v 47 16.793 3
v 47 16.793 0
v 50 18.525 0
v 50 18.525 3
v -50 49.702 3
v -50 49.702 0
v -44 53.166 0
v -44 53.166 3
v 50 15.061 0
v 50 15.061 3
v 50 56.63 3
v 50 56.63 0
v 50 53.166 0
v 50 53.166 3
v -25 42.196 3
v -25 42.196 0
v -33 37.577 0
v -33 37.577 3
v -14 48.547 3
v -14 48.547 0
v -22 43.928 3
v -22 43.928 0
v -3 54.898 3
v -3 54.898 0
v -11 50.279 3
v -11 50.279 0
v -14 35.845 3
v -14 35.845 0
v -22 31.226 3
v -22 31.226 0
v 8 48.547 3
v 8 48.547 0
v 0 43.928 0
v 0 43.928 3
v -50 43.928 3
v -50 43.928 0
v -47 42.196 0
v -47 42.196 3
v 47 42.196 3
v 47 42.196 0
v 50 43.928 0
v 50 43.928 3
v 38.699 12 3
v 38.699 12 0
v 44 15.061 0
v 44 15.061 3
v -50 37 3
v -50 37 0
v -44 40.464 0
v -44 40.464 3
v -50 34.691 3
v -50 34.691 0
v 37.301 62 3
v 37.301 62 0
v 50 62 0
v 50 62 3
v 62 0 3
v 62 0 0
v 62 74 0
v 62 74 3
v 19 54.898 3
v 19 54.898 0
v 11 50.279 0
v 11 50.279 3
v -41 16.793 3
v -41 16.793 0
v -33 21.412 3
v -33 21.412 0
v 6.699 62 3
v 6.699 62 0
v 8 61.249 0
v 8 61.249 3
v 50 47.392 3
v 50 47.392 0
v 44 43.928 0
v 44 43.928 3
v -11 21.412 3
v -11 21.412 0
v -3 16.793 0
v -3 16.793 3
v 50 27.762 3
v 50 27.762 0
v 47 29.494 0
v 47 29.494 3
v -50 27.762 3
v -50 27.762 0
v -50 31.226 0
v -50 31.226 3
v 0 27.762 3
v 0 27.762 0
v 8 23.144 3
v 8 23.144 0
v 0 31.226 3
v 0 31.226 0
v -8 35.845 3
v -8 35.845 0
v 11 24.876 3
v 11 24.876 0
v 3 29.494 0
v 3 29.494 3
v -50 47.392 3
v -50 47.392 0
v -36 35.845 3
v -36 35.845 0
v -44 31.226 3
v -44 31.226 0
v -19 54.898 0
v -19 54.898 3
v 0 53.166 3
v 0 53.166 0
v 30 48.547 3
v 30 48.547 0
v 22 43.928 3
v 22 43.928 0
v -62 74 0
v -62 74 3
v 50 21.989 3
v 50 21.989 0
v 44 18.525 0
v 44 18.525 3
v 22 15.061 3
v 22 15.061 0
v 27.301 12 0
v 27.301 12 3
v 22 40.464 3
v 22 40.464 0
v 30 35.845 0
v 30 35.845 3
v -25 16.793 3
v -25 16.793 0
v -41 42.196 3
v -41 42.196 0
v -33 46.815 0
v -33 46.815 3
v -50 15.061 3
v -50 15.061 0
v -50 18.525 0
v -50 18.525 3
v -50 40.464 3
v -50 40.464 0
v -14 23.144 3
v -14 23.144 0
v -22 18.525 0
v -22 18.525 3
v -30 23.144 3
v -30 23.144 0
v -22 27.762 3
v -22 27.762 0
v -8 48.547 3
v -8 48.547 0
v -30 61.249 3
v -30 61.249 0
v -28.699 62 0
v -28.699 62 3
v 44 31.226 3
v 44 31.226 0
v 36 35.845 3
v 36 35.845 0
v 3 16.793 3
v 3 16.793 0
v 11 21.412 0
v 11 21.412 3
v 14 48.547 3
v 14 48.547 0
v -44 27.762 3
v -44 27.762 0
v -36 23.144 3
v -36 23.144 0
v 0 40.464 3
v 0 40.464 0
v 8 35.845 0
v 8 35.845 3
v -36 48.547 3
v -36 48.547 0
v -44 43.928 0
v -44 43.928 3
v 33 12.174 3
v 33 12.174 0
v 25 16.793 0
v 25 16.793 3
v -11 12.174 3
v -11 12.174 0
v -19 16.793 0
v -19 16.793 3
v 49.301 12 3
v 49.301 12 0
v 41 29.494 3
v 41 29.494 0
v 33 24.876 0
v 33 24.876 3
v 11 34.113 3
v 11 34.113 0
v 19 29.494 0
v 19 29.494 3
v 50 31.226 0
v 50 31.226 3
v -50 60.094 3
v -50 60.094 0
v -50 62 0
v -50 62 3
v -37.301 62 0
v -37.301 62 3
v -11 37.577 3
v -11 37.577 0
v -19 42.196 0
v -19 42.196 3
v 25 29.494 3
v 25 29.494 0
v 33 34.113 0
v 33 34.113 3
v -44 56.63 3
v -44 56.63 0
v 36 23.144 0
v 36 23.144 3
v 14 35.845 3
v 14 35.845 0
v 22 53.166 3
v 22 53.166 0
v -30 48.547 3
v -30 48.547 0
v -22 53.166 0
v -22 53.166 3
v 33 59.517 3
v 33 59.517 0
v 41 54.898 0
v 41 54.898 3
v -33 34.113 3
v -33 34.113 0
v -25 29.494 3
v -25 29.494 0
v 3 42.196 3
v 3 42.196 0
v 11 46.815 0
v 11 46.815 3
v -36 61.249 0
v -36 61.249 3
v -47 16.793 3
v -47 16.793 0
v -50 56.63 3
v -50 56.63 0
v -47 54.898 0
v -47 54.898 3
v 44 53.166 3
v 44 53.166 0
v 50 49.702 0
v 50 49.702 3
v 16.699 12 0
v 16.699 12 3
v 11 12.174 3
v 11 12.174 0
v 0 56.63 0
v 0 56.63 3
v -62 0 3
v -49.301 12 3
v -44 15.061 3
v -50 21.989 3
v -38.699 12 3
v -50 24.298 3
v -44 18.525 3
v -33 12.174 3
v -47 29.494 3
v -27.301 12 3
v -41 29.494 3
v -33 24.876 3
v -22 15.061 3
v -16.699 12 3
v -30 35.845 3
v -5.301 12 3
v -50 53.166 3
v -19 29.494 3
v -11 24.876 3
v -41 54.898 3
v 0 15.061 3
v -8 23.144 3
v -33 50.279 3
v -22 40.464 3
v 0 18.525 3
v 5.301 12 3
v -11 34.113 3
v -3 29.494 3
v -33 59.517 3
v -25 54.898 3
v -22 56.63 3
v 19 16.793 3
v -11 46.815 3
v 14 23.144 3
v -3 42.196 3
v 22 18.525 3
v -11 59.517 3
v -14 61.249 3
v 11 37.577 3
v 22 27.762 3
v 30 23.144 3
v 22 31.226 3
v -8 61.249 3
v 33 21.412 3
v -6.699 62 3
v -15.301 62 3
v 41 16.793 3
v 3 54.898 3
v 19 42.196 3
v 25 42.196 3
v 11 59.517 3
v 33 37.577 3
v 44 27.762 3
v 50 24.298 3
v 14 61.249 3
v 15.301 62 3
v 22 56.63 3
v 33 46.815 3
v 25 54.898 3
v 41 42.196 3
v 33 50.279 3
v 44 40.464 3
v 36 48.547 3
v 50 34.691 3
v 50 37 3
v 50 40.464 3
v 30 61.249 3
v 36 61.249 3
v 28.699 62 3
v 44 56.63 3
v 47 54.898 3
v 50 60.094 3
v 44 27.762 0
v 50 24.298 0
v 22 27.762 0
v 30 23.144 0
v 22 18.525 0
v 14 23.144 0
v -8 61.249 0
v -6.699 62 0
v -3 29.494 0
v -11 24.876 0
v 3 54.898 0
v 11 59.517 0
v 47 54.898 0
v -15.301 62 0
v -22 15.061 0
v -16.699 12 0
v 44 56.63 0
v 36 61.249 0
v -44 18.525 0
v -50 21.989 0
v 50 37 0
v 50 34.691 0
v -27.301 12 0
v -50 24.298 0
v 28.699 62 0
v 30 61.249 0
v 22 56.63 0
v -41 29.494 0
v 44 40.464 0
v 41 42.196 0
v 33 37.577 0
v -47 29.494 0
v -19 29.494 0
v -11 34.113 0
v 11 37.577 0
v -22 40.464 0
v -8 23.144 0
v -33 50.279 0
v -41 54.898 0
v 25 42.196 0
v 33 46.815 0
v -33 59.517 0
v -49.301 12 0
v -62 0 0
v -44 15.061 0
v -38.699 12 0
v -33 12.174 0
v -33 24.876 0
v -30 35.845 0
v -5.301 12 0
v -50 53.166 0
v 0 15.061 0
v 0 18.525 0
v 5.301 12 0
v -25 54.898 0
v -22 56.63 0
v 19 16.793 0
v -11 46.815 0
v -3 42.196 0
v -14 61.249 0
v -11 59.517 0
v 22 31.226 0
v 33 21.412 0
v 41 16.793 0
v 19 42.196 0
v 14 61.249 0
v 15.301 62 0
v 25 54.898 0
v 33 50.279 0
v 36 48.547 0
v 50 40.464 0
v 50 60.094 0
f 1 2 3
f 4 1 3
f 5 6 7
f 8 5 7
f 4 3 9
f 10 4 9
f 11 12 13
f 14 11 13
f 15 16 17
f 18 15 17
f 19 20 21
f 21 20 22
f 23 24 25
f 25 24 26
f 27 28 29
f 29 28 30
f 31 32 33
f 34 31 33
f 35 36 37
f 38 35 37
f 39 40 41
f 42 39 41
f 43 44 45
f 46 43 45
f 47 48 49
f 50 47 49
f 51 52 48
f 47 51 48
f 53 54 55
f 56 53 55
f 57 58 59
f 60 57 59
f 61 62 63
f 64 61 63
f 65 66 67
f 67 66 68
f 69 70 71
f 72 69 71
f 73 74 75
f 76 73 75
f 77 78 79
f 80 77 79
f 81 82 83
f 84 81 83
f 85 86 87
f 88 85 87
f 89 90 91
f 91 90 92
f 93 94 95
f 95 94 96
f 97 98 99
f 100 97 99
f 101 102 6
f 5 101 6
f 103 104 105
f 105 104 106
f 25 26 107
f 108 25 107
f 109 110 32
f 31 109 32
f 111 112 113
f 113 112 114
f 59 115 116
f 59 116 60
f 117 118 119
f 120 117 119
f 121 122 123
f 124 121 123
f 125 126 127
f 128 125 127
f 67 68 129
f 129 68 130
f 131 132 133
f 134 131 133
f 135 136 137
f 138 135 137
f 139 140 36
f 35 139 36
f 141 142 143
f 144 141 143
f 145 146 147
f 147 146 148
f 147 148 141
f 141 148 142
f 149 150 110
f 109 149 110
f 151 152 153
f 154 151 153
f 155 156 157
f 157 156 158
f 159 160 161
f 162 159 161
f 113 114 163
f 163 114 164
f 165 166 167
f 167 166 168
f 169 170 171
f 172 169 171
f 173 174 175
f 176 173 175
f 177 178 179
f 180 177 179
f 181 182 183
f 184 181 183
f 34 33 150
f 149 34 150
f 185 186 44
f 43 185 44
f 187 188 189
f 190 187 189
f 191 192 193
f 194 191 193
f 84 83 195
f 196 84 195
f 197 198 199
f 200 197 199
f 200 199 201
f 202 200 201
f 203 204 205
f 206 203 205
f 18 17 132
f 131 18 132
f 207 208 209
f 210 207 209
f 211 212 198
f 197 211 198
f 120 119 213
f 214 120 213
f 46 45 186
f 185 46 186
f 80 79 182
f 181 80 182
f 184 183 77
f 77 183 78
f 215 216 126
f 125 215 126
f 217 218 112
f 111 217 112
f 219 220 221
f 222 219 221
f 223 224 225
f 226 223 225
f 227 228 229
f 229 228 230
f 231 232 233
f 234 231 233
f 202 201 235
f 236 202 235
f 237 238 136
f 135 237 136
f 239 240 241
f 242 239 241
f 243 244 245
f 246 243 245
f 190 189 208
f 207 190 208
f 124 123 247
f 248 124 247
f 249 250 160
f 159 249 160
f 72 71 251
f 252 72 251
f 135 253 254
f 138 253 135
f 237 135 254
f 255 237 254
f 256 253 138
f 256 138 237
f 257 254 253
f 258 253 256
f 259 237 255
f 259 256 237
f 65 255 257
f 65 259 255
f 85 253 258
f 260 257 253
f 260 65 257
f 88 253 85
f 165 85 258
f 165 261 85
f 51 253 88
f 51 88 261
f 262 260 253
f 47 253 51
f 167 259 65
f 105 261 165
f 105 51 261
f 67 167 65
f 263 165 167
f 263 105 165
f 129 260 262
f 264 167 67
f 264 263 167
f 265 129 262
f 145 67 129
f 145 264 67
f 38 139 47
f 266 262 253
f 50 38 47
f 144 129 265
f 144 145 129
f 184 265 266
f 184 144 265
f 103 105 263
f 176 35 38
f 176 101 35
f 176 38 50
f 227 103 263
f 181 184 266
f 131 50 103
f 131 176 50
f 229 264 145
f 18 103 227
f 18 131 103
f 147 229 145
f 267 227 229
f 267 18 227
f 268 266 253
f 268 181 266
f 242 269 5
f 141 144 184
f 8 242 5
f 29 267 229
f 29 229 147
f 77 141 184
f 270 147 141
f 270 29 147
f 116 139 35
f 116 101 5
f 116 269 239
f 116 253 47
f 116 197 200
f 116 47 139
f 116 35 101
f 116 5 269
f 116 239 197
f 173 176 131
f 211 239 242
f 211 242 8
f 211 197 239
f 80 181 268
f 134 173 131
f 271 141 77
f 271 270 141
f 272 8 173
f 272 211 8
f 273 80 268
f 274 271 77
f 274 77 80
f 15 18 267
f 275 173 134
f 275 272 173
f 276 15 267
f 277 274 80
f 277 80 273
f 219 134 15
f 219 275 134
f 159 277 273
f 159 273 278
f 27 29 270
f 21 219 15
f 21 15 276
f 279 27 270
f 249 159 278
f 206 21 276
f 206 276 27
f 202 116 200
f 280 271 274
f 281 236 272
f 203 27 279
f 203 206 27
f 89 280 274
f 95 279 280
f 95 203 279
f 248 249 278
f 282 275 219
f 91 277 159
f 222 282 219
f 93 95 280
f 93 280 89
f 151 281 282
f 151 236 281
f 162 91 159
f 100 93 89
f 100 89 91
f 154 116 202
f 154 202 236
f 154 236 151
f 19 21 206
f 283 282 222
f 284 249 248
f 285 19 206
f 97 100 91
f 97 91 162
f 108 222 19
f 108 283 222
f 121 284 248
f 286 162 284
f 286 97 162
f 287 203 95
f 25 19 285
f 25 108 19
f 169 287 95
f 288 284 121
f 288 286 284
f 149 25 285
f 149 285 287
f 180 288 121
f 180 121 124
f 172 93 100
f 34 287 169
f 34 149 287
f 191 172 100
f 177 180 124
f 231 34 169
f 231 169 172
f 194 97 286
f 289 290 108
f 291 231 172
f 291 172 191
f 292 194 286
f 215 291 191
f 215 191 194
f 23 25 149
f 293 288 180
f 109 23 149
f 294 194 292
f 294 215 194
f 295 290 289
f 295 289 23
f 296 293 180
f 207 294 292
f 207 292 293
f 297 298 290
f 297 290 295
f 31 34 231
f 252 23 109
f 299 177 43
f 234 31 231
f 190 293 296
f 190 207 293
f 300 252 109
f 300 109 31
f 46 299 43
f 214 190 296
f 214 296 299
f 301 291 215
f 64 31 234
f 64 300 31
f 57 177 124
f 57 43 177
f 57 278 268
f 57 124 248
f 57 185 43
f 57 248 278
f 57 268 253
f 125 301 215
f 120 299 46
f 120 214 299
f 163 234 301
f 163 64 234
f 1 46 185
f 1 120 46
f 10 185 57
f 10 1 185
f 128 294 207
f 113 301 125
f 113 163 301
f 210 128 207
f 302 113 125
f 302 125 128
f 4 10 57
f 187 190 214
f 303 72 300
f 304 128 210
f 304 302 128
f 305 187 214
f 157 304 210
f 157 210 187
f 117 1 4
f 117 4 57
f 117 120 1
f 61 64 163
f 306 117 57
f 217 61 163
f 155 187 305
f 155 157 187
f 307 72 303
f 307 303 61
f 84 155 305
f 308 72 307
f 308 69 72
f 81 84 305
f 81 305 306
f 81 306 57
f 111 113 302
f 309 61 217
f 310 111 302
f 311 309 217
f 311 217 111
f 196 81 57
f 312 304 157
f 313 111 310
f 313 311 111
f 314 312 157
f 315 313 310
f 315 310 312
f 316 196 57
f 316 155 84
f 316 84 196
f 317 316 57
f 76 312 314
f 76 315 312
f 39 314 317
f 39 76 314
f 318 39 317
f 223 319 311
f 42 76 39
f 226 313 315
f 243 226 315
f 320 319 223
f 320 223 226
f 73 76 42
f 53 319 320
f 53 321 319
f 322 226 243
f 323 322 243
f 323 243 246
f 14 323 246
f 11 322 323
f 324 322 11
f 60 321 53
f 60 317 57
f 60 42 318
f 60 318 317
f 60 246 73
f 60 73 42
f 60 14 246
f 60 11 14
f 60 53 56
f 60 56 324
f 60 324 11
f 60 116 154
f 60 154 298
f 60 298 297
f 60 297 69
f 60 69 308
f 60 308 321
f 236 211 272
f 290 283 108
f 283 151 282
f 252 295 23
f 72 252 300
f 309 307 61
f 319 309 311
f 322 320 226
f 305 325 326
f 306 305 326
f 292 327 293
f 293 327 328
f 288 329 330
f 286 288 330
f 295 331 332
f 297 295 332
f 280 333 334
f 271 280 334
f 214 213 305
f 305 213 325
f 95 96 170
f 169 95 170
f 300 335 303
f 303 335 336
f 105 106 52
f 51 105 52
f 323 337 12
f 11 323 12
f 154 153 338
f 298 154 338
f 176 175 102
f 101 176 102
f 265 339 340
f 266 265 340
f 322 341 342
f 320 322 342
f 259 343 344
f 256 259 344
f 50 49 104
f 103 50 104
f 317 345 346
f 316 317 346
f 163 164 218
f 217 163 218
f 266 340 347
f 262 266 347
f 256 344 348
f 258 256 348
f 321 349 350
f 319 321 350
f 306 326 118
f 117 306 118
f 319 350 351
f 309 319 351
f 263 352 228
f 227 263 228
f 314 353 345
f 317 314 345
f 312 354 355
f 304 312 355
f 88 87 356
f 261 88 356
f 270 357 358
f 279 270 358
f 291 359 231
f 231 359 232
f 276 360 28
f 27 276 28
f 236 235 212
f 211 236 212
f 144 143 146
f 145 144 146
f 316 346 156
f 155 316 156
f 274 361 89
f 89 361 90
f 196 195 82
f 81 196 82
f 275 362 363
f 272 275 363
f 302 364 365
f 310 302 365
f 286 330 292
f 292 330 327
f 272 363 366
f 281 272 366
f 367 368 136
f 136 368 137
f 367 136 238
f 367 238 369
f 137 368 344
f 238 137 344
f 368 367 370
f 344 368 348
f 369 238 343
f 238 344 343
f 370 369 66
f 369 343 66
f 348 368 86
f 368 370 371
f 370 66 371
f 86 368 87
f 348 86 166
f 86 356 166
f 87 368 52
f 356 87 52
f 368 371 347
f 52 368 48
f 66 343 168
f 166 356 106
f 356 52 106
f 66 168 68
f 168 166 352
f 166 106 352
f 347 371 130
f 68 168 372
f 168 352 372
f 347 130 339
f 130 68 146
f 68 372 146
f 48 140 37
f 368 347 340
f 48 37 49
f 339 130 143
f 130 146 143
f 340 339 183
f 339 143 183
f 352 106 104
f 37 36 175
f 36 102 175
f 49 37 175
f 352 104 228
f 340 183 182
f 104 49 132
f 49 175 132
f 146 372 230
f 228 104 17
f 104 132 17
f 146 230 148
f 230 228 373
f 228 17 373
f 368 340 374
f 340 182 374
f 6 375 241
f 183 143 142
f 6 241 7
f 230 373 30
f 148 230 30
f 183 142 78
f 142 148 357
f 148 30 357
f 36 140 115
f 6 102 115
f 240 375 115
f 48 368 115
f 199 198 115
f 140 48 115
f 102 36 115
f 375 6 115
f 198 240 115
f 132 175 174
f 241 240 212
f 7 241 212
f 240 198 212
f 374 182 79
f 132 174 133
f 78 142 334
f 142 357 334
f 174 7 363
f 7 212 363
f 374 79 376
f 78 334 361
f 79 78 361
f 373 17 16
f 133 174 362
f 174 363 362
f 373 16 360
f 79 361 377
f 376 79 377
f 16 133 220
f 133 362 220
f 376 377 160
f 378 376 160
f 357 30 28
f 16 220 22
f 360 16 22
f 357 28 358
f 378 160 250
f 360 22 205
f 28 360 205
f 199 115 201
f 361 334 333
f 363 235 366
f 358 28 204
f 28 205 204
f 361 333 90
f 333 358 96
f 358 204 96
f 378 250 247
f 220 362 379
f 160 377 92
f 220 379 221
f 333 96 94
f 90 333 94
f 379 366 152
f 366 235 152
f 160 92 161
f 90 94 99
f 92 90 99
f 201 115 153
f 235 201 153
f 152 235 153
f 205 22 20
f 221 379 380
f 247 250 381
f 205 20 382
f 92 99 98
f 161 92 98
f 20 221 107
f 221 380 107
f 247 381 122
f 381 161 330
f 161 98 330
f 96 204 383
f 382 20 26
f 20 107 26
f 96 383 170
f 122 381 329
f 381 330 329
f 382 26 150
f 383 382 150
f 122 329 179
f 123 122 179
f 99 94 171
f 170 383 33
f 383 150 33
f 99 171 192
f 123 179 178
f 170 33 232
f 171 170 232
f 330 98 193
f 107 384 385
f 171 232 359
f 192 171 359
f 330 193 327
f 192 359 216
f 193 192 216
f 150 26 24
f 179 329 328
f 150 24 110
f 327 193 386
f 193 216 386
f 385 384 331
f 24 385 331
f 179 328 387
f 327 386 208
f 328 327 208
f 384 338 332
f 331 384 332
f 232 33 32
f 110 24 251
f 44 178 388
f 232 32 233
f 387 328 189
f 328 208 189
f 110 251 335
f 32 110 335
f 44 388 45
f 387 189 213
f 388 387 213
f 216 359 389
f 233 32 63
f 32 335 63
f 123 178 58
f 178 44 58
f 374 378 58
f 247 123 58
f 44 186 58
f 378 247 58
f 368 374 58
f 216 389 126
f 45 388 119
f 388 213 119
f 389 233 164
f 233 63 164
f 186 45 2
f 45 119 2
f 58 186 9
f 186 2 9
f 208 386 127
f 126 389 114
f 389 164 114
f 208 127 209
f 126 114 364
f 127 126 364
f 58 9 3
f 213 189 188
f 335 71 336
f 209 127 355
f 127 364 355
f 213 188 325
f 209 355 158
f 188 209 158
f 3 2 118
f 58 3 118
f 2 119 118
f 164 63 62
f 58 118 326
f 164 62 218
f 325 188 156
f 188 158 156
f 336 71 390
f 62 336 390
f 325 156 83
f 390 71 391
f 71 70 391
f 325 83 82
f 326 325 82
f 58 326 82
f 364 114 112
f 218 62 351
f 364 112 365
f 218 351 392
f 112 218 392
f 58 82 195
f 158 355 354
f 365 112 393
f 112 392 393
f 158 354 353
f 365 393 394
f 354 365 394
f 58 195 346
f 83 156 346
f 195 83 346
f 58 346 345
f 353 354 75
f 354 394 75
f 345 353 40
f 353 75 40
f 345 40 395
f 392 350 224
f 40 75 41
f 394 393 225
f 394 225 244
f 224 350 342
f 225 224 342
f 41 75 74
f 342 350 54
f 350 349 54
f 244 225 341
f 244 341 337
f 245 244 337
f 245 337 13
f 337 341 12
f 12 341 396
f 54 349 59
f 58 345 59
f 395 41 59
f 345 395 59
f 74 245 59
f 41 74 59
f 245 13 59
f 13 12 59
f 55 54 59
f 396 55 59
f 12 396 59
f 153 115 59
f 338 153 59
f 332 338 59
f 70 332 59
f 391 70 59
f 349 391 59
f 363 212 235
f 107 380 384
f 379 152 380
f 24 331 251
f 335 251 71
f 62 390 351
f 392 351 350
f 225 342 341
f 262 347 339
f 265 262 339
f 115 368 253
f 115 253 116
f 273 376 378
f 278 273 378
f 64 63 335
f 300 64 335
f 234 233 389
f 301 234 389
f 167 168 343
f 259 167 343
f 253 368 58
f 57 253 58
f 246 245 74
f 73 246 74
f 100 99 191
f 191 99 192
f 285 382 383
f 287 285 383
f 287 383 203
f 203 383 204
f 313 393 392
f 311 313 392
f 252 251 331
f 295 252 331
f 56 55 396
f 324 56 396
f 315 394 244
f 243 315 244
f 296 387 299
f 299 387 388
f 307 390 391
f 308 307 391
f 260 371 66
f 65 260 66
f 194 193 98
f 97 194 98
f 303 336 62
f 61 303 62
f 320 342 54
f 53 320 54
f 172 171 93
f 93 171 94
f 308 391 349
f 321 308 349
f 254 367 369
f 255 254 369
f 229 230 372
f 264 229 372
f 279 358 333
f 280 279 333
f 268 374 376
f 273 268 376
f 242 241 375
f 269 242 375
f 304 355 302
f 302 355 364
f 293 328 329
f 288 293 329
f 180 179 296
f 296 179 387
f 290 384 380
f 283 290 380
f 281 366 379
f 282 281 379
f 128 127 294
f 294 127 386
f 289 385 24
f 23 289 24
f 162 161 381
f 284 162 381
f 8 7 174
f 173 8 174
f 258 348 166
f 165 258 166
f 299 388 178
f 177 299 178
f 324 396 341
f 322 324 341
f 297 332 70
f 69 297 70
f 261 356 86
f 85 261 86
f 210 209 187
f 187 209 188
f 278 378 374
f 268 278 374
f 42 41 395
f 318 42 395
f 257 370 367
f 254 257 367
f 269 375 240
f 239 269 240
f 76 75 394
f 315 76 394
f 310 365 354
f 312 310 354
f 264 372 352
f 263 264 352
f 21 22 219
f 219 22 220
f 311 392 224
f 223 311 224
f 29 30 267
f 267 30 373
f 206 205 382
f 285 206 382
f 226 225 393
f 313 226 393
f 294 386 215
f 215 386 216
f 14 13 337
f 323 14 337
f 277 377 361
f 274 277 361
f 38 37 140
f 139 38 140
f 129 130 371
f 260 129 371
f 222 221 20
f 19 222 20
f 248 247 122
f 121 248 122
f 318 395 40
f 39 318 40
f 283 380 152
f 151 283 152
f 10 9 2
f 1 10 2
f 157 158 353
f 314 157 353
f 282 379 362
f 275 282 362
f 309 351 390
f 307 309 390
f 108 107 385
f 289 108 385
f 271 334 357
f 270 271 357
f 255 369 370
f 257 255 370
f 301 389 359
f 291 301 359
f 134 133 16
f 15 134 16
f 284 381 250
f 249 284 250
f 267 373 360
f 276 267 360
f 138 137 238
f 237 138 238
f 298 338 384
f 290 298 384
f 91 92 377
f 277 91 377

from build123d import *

# Parameters (mm, degrees)
F0_W     = 124
F0_H     = 74
F1_DEPTH = 3


with BuildPart() as f1:
    # F0 (on Top) → F1 (new body)
    with BuildSketch(Plane.XY):
        with Locations((0, 37)):
            Rectangle(F0_W, F0_H)
        Polygon((-47, 16.792741), (-50, 15.06069), (-50, 18.524791), align=None, mode=Mode.SUBTRACT)
        Polygon((-38.69873, 12), (-49.30127, 12), (-44, 15.06069), align=None, mode=Mode.SUBTRACT)
        Polygon((-25, 16.792741), (-33, 12.173938), (-41, 16.792741), (-33, 21.411543), align=None, mode=Mode.SUBTRACT)
        Polygon((-16.69873, 12), (-27.30127, 12), (-22, 15.06069), align=None, mode=Mode.SUBTRACT)
        Polygon((5.30127, 12), (-5.30127, 12), (0, 15.06069), align=None, mode=Mode.SUBTRACT)
        Polygon((-3, 16.792741), (-11, 12.173938), (-19, 16.792741), (-11, 21.411543), align=None, mode=Mode.SUBTRACT)
        Polygon((-50, 21.988893), (-50, 24.298294), (-44, 27.762396), (-36, 23.143594), (-44, 18.524791), align=None, mode=Mode.SUBTRACT)
        Polygon((-47, 29.494447), (-50, 27.762396), (-50, 31.226497), align=None, mode=Mode.SUBTRACT)
        Polygon((-33, 24.875644), (-41, 29.494447), (-33, 34.113249), (-25, 29.494447), align=None, mode=Mode.SUBTRACT)
        Polygon((-50, 34.690599), (-50, 37), (-44, 40.464102), (-36, 35.845299), (-44, 31.226497), align=None, mode=Mode.SUBTRACT)
        Polygon((-22, 18.524791), (-30, 23.143594), (-22, 27.762396), (-14, 23.143594), align=None, mode=Mode.SUBTRACT)
        Polygon((-22, 31.226497), (-30, 35.845299), (-22, 40.464102), (-14, 35.845299), align=None, mode=Mode.SUBTRACT)
        Polygon((-3, 29.494447), (-11, 24.875644), (-19, 29.494447), (-11, 34.113249), align=None, mode=Mode.SUBTRACT)
        Polygon((19, 16.792741), (11, 12.173938), (3, 16.792741), (11, 21.411543), align=None, mode=Mode.SUBTRACT)
        Polygon((27.30127, 12), (16.69873, 12), (22, 15.06069), align=None, mode=Mode.SUBTRACT)
        Polygon((49.30127, 12), (38.69873, 12), (44, 15.06069), align=None, mode=Mode.SUBTRACT)
        Polygon((41, 16.792741), (33, 12.173938), (25, 16.792741), (33, 21.411543), align=None, mode=Mode.SUBTRACT)
        Polygon((50, 18.524791), (50, 15.06069), (47, 16.792741), align=None, mode=Mode.SUBTRACT)
        Polygon((0, 18.524791), (-8, 23.143594), (0, 27.762396), (8, 23.143594), align=None, mode=Mode.SUBTRACT)
        Polygon((22, 18.524791), (14, 23.143594), (22, 27.762396), (30, 23.143594), align=None, mode=Mode.SUBTRACT)
        Polygon((11, 24.875644), (3, 29.494447), (11, 34.113249), (19, 29.494447), align=None, mode=Mode.SUBTRACT)
        Polygon((0, 31.226497), (-8, 35.845299), (0, 40.464102), (8, 35.845299), align=None, mode=Mode.SUBTRACT)
        Polygon((22, 40.464102), (30, 35.845299), (22, 31.226497), (14, 35.845299), align=None, mode=Mode.SUBTRACT)
        Polygon((44, 27.762396), (50, 24.298294), (50, 21.988893), (44, 18.524791), (36, 23.143594), align=None, mode=Mode.SUBTRACT)
        Polygon((33, 34.113249), (41, 29.494447), (33, 24.875644), (25, 29.494447), align=None, mode=Mode.SUBTRACT)
        Polygon((50, 37), (50, 34.690599), (44, 31.226497), (36, 35.845299), (44, 40.464102), align=None, mode=Mode.SUBTRACT)
        Polygon((50, 31.226497), (50, 27.762396), (47, 29.494447), align=None, mode=Mode.SUBTRACT)
        Polygon((-47, 42.196152), (-50, 40.464102), (-50, 43.928203), align=None, mode=Mode.SUBTRACT)
        Polygon((-25, 42.196152), (-33, 37.57735), (-41, 42.196152), (-33, 46.814955), align=None, mode=Mode.SUBTRACT)
        Polygon((-47, 54.897858), (-50, 53.165808), (-50, 56.629909), align=None, mode=Mode.SUBTRACT)
        Polygon((-50, 47.392305), (-50, 49.701706), (-44, 53.165808), (-36, 48.547005), (-44, 43.928203), align=None, mode=Mode.SUBTRACT)
        Polygon((-25, 54.897858), (-33, 50.279056), (-41, 54.897858), (-33, 59.51666), align=None, mode=Mode.SUBTRACT)
        Polygon((-11, 37.57735), (-19, 42.196152), (-11, 46.814955), (-3, 42.196152), align=None, mode=Mode.SUBTRACT)
        Polygon((-22, 43.928203), (-30, 48.547005), (-22, 53.165808), (-14, 48.547005), align=None, mode=Mode.SUBTRACT)
        Polygon((-11, 50.279056), (-19, 54.897858), (-11, 59.51666), (-3, 54.897858), align=None, mode=Mode.SUBTRACT)
        Polygon((-50, 60.094011), (-50, 62), (-37.30127, 62), (-36, 61.248711), (-44, 56.629909), align=None, mode=Mode.SUBTRACT)
        Polygon((-22, 56.629909), (-30, 61.248711), (-28.69873, 62), (-15.30127, 62), (-14, 61.248711), align=None, mode=Mode.SUBTRACT)
        Polygon((11, 37.57735), (3, 42.196152), (11, 46.814955), (19, 42.196152), align=None, mode=Mode.SUBTRACT)
        Polygon((0, 43.928203), (-8, 48.547005), (0, 53.165808), (8, 48.547005), align=None, mode=Mode.SUBTRACT)
        Polygon((11, 50.279056), (3, 54.897858), (11, 59.51666), (19, 54.897858), align=None, mode=Mode.SUBTRACT)
        Polygon((22, 43.928203), (14, 48.547005), (22, 53.165808), (30, 48.547005), align=None, mode=Mode.SUBTRACT)
        Polygon((33, 46.814955), (41, 42.196152), (33, 37.57735), (25, 42.196152), align=None, mode=Mode.SUBTRACT)
        Polygon((50, 43.928203), (50, 40.464102), (47, 42.196152), align=None, mode=Mode.SUBTRACT)
        Polygon((44, 53.165808), (50, 49.701706), (50, 47.392305), (44, 43.928203), (36, 48.547005), align=None, mode=Mode.SUBTRACT)
        Polygon((33, 50.279056), (25, 54.897858), (33, 59.51666), (41, 54.897858), align=None, mode=Mode.SUBTRACT)
        Polygon((50, 56.629909), (50, 53.165808), (47, 54.897858), align=None, mode=Mode.SUBTRACT)
        Polygon((-8, 61.248711), (-6.69873, 62), (6.69873, 62), (8, 61.248711), (0, 56.629909), align=None, mode=Mode.SUBTRACT)
        Polygon((14, 61.248711), (15.30127, 62), (28.69873, 62), (30, 61.248711), (22, 56.629909), align=None, mode=Mode.SUBTRACT)
        Polygon((37.30127, 62), (50, 62), (50, 60.094011), (44, 56.629909), (36, 61.248711), align=None, mode=Mode.SUBTRACT)
    extrude(amount=F1_DEPTH)


solid = f1.part
